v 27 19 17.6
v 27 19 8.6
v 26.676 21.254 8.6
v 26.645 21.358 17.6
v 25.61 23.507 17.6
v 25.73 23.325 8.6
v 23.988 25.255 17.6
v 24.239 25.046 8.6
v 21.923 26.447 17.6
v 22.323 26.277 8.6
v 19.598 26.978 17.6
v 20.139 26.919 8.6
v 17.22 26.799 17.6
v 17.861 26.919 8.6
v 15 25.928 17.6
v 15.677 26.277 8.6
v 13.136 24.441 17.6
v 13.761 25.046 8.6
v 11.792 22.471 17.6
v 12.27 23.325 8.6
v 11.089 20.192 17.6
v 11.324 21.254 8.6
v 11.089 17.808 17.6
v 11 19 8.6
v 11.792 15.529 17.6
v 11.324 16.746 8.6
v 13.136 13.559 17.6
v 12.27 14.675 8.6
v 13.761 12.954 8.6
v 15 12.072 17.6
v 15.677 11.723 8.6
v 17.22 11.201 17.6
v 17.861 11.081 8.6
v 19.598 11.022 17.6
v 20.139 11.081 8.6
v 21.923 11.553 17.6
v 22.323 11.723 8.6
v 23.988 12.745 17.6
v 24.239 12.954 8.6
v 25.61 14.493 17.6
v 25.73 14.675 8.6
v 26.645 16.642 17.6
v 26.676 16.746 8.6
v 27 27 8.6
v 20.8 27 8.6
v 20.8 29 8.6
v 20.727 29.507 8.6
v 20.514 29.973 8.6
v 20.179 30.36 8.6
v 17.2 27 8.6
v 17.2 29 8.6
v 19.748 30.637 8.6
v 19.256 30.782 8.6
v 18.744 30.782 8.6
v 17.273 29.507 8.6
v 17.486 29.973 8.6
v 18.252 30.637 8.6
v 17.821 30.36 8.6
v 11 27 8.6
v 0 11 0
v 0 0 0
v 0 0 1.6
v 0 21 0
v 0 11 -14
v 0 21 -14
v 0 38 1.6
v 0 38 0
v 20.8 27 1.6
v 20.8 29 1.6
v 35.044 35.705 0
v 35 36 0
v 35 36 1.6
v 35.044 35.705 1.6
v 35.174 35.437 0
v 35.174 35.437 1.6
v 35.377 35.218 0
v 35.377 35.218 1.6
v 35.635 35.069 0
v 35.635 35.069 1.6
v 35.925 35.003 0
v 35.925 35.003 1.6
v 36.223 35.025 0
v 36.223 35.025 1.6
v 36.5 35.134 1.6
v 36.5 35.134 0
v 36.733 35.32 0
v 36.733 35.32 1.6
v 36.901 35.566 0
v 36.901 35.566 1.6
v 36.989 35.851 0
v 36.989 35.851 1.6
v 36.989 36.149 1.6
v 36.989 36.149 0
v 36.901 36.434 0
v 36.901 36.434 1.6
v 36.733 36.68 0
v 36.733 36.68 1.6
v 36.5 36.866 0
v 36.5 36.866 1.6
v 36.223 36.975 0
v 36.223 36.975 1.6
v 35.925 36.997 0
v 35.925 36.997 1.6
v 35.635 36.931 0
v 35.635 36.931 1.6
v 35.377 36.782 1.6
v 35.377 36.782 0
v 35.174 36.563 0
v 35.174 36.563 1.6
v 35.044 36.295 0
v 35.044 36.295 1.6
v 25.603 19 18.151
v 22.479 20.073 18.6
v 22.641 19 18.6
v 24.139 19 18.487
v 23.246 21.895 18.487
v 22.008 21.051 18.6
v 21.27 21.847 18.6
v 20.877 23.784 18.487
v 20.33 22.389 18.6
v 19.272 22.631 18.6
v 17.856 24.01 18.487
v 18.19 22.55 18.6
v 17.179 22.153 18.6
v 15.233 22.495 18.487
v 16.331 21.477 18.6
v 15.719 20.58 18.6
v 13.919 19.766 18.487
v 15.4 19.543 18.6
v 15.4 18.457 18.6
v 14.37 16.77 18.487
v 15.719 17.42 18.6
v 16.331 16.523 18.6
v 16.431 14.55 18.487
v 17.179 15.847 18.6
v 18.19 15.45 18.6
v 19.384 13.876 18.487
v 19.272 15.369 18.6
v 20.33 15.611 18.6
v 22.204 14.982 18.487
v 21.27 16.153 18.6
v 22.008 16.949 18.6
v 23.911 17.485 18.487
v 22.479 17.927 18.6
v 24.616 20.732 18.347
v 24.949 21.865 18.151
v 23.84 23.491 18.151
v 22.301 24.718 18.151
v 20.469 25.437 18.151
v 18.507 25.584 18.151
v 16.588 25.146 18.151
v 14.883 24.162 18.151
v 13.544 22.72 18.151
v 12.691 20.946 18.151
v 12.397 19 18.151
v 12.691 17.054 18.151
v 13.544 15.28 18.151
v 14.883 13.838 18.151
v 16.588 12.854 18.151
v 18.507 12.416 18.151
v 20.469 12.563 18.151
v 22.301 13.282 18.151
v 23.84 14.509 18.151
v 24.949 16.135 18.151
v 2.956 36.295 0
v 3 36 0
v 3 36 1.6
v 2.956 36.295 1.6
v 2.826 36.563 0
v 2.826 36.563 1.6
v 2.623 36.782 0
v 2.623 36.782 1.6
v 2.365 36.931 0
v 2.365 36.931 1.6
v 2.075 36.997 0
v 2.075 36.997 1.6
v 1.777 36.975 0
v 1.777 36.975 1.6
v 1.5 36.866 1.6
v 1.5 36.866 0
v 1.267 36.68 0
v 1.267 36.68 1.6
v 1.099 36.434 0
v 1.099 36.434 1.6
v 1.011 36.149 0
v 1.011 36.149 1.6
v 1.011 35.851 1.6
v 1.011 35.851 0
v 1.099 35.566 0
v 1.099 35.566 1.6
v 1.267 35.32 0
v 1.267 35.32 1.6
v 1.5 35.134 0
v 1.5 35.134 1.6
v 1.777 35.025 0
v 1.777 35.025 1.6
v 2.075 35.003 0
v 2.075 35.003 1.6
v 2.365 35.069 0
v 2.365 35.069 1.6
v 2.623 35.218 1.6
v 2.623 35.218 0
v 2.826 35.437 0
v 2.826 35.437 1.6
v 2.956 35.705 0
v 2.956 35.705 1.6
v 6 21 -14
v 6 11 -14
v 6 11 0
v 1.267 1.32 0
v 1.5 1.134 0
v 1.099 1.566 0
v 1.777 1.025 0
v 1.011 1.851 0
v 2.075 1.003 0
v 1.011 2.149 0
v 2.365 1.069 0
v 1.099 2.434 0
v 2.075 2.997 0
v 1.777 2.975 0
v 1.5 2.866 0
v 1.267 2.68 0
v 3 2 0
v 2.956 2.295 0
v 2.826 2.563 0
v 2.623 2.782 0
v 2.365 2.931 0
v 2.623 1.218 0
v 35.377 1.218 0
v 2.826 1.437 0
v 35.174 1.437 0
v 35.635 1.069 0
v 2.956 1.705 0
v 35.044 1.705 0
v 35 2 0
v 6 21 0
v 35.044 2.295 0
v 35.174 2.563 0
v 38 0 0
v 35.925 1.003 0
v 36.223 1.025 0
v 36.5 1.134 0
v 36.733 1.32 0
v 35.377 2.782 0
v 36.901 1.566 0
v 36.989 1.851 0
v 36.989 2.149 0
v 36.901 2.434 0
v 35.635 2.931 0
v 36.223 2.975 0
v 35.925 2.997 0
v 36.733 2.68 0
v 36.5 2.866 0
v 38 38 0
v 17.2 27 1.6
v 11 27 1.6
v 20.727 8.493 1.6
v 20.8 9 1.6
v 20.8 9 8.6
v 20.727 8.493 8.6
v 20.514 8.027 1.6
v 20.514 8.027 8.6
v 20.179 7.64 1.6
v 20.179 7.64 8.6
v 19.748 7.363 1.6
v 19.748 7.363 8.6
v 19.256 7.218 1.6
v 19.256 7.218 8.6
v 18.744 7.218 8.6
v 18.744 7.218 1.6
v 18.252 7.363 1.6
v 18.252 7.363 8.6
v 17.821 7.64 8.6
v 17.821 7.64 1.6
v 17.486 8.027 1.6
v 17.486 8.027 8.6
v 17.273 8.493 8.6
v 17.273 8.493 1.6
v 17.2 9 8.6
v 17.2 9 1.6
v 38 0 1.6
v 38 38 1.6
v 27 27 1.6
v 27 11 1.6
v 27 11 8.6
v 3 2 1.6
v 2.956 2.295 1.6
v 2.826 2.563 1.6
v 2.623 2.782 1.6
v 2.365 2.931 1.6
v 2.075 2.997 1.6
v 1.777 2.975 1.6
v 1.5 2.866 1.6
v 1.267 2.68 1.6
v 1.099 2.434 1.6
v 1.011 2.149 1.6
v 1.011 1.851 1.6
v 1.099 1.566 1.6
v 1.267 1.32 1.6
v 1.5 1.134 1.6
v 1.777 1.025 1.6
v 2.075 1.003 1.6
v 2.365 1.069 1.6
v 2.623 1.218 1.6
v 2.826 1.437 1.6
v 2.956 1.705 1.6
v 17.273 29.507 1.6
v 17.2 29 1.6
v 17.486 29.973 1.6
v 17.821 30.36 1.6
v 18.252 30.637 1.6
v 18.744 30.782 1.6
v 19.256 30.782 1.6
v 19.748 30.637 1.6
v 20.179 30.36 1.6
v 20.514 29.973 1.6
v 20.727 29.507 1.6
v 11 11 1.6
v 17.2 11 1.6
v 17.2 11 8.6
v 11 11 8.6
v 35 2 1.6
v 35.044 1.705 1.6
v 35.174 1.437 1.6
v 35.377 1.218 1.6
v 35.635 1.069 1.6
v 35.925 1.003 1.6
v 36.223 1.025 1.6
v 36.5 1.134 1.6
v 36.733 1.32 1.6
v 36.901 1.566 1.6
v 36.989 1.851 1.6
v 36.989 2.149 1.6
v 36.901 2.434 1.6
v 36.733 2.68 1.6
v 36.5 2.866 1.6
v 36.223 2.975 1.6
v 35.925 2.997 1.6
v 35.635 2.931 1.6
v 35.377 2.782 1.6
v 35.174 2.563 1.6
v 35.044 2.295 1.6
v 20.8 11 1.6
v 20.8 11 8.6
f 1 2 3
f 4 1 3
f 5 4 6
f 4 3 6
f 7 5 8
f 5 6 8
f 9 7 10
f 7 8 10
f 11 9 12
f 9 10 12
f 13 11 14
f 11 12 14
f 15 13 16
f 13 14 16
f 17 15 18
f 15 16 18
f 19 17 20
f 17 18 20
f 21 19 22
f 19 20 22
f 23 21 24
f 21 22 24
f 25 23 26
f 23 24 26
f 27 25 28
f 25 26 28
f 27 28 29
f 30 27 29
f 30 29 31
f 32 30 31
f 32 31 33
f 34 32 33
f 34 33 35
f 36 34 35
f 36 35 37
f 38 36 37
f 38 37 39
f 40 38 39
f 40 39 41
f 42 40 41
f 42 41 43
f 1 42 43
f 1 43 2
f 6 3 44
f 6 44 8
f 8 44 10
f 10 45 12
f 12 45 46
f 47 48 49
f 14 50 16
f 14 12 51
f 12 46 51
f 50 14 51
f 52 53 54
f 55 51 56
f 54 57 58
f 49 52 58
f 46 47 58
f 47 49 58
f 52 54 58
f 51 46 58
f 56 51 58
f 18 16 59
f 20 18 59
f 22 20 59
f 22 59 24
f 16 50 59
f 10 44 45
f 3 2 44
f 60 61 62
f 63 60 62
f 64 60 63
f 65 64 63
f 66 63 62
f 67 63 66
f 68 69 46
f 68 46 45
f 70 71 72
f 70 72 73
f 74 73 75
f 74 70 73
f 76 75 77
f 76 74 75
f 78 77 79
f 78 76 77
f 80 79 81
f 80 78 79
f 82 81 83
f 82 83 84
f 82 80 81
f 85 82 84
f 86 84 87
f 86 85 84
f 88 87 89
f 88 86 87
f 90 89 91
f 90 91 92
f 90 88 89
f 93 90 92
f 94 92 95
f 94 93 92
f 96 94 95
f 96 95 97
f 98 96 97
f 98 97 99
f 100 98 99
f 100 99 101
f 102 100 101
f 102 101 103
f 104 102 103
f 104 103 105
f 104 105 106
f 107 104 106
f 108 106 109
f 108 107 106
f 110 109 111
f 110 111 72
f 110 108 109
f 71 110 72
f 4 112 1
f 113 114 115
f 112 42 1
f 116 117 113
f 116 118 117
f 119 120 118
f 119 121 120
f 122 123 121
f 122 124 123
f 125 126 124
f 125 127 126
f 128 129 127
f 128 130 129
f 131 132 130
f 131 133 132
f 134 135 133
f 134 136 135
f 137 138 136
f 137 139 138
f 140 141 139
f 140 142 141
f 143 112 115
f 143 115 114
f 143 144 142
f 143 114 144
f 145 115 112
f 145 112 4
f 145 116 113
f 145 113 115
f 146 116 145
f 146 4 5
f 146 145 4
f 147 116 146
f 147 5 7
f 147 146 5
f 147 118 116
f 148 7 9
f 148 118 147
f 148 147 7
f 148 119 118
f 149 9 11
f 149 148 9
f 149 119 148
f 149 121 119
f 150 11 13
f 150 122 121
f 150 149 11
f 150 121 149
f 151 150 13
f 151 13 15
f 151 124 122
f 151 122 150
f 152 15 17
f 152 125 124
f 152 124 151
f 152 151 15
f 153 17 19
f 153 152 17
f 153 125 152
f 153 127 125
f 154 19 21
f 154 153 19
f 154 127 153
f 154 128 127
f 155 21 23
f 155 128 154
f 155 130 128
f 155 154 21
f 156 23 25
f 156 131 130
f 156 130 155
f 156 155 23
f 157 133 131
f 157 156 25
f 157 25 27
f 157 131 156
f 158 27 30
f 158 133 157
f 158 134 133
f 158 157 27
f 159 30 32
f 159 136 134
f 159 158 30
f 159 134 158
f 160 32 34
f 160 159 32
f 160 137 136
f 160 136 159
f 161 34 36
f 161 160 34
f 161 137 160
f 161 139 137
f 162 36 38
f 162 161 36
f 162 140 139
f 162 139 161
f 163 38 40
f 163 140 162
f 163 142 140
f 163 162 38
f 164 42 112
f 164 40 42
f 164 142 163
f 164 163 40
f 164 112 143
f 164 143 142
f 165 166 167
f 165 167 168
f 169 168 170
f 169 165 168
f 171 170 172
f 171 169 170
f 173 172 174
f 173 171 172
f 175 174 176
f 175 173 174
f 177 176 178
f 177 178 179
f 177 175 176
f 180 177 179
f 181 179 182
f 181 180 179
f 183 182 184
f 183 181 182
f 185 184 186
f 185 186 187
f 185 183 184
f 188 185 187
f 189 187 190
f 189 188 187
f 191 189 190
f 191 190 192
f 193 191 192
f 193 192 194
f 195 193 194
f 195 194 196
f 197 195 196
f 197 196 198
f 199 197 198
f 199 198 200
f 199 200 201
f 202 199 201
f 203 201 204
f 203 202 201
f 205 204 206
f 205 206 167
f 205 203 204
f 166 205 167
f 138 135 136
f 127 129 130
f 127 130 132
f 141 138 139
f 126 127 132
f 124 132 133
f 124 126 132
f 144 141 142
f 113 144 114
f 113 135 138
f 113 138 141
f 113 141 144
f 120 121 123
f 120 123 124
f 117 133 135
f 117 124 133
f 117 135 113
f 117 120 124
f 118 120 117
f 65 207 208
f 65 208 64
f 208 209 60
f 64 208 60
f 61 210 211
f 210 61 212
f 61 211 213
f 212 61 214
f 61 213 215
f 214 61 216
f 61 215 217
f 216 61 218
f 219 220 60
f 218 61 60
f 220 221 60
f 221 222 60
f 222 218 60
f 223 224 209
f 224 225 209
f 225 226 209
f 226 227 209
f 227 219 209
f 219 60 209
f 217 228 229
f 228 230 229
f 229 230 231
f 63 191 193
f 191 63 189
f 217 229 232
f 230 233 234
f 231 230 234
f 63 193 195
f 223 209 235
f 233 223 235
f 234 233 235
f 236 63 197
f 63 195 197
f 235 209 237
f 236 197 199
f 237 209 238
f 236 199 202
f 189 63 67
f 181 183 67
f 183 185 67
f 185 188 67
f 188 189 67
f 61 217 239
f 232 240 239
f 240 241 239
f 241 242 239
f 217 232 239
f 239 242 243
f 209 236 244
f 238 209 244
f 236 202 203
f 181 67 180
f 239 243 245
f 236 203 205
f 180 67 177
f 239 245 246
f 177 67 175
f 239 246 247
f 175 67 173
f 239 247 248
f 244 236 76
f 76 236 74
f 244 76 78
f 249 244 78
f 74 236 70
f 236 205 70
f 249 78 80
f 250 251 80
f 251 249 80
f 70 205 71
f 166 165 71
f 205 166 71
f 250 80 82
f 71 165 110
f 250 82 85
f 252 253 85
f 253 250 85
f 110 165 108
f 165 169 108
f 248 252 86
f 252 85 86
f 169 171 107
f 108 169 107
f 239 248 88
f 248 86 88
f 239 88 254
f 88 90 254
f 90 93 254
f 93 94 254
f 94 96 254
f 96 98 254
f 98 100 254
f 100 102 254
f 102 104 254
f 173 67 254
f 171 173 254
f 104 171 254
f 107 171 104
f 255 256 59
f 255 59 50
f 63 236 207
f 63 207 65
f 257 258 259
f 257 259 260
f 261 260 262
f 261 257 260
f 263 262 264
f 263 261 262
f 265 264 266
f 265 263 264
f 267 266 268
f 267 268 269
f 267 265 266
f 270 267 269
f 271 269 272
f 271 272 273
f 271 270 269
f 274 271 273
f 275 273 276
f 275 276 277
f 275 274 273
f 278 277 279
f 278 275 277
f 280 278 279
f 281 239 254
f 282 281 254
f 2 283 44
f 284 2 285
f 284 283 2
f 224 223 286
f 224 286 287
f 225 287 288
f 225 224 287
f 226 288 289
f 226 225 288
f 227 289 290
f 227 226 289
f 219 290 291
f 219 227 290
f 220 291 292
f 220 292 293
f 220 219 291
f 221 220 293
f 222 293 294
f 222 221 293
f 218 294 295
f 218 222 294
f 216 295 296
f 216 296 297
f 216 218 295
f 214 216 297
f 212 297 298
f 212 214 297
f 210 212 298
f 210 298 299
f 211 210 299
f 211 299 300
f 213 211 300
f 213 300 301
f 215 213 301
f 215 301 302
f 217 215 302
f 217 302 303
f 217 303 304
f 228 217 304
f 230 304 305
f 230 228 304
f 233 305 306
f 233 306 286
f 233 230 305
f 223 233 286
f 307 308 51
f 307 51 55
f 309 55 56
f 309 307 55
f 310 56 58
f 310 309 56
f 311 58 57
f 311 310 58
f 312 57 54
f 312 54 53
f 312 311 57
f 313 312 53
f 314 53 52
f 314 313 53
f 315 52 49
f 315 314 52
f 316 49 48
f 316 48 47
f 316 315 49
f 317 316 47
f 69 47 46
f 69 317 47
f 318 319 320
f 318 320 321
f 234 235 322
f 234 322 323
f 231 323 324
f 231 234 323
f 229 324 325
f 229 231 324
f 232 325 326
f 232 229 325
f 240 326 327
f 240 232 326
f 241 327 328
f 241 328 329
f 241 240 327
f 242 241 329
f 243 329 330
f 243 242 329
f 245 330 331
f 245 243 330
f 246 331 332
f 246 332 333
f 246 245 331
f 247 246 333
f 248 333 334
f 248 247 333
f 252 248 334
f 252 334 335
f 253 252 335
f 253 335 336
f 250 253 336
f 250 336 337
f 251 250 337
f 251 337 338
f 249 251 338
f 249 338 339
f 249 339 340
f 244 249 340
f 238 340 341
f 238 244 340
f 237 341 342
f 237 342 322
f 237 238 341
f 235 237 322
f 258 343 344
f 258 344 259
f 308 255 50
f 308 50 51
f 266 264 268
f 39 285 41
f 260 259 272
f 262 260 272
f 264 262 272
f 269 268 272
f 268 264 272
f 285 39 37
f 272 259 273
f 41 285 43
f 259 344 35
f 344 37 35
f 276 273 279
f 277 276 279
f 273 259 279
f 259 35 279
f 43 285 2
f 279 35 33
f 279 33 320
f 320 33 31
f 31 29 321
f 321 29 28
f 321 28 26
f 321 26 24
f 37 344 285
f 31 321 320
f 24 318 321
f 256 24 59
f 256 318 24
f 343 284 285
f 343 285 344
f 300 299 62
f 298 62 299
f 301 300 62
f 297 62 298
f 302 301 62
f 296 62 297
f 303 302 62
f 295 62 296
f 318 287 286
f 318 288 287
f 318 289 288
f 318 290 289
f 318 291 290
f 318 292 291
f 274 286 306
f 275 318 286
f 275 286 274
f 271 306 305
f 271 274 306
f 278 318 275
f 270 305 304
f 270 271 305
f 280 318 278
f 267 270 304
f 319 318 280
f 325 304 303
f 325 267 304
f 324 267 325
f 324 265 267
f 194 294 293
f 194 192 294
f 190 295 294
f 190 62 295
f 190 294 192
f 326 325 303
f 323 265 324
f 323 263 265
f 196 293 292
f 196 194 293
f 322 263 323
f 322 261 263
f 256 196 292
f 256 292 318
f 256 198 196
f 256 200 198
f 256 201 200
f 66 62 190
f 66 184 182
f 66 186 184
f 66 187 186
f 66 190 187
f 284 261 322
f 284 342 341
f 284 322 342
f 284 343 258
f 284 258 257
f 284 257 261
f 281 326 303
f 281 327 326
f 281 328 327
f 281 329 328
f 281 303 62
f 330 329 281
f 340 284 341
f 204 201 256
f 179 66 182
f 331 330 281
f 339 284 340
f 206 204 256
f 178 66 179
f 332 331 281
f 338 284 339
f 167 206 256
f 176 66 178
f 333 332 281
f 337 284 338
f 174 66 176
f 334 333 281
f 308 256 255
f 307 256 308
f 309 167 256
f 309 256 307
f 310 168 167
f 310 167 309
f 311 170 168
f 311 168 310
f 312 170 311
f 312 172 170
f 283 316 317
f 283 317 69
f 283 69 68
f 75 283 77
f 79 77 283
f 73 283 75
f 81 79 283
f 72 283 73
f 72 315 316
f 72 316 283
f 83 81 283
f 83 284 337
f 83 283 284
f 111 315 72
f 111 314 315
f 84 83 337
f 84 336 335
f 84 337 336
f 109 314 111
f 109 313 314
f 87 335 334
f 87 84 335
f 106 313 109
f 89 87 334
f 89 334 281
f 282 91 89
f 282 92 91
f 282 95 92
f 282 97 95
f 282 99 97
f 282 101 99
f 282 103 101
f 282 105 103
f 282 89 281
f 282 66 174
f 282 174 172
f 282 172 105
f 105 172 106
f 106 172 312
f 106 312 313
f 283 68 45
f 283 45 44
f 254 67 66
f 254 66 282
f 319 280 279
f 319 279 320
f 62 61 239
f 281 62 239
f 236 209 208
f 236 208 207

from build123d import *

# Parameters (mm, degrees)
ESQUISSE1_W        = 38
ESQUISSE1_H        = 38
ESQUISSE1_R        = 1
BOSS_EXTRU_1_DEPTH = 1.6
BOSS_EXTRU_2_DEPTH = 7
ESQUISSE3_R        = 8
BOSS_EXTRU_3_DEPTH = 10
CHANFREIN1_SIZE    = 1
CHANFREIN1_SIZE2   = 1.732050808
CONG_1_R           = 10
ESQUISSE4_W        = 6
ESQUISSE4_H        = 10
BOSS_EXTRU_4_DEPTH = 14


with BuildPart() as part:
    # Esquisse1 → Boss.-Extru.1 (new body)
    with BuildSketch(Plane.XY):
        with Locations((19, 19)):
            Rectangle(ESQUISSE1_W, ESQUISSE1_H)
        with Locations((2, 36)):
            Circle(ESQUISSE1_R, mode=Mode.SUBTRACT)
        with Locations((2, 2)):
            Circle(ESQUISSE1_R, mode=Mode.SUBTRACT)
        with Locations(Location((36, 2, 0), (0, 0, 180))):
            Circle(ESQUISSE1_R, mode=Mode.SUBTRACT)
        with Locations(Location((36, 36, 0), (0, 0, 180))):
            Circle(ESQUISSE1_R, mode=Mode.SUBTRACT)
    extrude(amount=BOSS_EXTRU_1_DEPTH)

    # Esquisse2 → Boss.-Extru.2 (add)
    with BuildSketch(Plane.XY.offset(1.6)):
        with BuildLine():
            Line((11, 27), (17.2, 27))
            Line((17.2, 27), (17.2, 29))
            ThreePointArc((17.2, 29), (19, 30.8), (20.8, 29))
            Line((20.8, 29), (20.8, 27))
            Line((20.8, 27), (27, 27))
            Line((27, 27), (27, 11))
            Line((27, 11), (20.8, 11))
            Line((20.8, 11), (20.8, 9))
            ThreePointArc((20.8, 9), (19, 7.2), (17.2, 9))
            Line((17.2, 9), (17.2, 11))
            Line((17.2, 11), (11, 11))
            Line((11, 11), (11, 27))
        make_face()
    extrude(amount=BOSS_EXTRU_2_DEPTH)

    # Esquisse3 → Boss.-Extru.3 (add)
    with BuildSketch(Plane.XY.offset(8.6)):
        with Locations((19, 19)):
            Circle(ESQUISSE3_R)
    extrude(amount=BOSS_EXTRU_3_DEPTH)

    # Chanfrein1
    chanfrein1_edges = [part.edges().sort_by_distance(p)[0] for p in [
        (11, 19, 18.6),
    ]]
    chanfrein1_side = [part.faces().sort_by_distance(p)[0] for p in [
        (11, 19, 13.6),
    ]]
    chamfer(chanfrein1_edges, length=CHANFREIN1_SIZE, length2=CHANFREIN1_SIZE2, reference=chanfrein1_side[0])

    # Congé1
    # the kernel refuses this fillet: 10 mm, written as the material it takes off along each edge
    with BuildSketch(Plane(origin=(19, 19, 18.6), x_dir=(1, 0, 0), z_dir=(0, -1, 0))) as cong_1_piece_1:
        with BuildLine():
            CenterArc((3.641101056, -10), CONG_1_R, 64.158067237, 25.841932763)
            Line((3.641101056, 0), (3.641101056, 0.2))
            Line((3.641101056, 0.2), (6.267949192, 0.2))
            Line((6.267949192, 0.2), (6.367949192, 0.173205081))
            ThreePointArc((6.367949192, 0.173205081), (7.233974596, -0.326794919), (8.087177979, -0.82))
            Line((8.087177979, -0.82), (8, -1))
        make_face()
    revolve(axis=Axis((19, 19, 18.6), (0, 0, 1)), mode=Mode.SUBTRACT)

    # Esquisse4 → Boss.-Extru.4 (add)
    with BuildSketch(Plane(origin=(0, 0, 0), x_dir=(-1, 0, 0), z_dir=(0, 0, -1))):
        with Locations((-3, 16)):
            Rectangle(ESQUISSE4_W, ESQUISSE4_H)
    extrude(amount=BOSS_EXTRU_4_DEPTH)


solid = part.part
